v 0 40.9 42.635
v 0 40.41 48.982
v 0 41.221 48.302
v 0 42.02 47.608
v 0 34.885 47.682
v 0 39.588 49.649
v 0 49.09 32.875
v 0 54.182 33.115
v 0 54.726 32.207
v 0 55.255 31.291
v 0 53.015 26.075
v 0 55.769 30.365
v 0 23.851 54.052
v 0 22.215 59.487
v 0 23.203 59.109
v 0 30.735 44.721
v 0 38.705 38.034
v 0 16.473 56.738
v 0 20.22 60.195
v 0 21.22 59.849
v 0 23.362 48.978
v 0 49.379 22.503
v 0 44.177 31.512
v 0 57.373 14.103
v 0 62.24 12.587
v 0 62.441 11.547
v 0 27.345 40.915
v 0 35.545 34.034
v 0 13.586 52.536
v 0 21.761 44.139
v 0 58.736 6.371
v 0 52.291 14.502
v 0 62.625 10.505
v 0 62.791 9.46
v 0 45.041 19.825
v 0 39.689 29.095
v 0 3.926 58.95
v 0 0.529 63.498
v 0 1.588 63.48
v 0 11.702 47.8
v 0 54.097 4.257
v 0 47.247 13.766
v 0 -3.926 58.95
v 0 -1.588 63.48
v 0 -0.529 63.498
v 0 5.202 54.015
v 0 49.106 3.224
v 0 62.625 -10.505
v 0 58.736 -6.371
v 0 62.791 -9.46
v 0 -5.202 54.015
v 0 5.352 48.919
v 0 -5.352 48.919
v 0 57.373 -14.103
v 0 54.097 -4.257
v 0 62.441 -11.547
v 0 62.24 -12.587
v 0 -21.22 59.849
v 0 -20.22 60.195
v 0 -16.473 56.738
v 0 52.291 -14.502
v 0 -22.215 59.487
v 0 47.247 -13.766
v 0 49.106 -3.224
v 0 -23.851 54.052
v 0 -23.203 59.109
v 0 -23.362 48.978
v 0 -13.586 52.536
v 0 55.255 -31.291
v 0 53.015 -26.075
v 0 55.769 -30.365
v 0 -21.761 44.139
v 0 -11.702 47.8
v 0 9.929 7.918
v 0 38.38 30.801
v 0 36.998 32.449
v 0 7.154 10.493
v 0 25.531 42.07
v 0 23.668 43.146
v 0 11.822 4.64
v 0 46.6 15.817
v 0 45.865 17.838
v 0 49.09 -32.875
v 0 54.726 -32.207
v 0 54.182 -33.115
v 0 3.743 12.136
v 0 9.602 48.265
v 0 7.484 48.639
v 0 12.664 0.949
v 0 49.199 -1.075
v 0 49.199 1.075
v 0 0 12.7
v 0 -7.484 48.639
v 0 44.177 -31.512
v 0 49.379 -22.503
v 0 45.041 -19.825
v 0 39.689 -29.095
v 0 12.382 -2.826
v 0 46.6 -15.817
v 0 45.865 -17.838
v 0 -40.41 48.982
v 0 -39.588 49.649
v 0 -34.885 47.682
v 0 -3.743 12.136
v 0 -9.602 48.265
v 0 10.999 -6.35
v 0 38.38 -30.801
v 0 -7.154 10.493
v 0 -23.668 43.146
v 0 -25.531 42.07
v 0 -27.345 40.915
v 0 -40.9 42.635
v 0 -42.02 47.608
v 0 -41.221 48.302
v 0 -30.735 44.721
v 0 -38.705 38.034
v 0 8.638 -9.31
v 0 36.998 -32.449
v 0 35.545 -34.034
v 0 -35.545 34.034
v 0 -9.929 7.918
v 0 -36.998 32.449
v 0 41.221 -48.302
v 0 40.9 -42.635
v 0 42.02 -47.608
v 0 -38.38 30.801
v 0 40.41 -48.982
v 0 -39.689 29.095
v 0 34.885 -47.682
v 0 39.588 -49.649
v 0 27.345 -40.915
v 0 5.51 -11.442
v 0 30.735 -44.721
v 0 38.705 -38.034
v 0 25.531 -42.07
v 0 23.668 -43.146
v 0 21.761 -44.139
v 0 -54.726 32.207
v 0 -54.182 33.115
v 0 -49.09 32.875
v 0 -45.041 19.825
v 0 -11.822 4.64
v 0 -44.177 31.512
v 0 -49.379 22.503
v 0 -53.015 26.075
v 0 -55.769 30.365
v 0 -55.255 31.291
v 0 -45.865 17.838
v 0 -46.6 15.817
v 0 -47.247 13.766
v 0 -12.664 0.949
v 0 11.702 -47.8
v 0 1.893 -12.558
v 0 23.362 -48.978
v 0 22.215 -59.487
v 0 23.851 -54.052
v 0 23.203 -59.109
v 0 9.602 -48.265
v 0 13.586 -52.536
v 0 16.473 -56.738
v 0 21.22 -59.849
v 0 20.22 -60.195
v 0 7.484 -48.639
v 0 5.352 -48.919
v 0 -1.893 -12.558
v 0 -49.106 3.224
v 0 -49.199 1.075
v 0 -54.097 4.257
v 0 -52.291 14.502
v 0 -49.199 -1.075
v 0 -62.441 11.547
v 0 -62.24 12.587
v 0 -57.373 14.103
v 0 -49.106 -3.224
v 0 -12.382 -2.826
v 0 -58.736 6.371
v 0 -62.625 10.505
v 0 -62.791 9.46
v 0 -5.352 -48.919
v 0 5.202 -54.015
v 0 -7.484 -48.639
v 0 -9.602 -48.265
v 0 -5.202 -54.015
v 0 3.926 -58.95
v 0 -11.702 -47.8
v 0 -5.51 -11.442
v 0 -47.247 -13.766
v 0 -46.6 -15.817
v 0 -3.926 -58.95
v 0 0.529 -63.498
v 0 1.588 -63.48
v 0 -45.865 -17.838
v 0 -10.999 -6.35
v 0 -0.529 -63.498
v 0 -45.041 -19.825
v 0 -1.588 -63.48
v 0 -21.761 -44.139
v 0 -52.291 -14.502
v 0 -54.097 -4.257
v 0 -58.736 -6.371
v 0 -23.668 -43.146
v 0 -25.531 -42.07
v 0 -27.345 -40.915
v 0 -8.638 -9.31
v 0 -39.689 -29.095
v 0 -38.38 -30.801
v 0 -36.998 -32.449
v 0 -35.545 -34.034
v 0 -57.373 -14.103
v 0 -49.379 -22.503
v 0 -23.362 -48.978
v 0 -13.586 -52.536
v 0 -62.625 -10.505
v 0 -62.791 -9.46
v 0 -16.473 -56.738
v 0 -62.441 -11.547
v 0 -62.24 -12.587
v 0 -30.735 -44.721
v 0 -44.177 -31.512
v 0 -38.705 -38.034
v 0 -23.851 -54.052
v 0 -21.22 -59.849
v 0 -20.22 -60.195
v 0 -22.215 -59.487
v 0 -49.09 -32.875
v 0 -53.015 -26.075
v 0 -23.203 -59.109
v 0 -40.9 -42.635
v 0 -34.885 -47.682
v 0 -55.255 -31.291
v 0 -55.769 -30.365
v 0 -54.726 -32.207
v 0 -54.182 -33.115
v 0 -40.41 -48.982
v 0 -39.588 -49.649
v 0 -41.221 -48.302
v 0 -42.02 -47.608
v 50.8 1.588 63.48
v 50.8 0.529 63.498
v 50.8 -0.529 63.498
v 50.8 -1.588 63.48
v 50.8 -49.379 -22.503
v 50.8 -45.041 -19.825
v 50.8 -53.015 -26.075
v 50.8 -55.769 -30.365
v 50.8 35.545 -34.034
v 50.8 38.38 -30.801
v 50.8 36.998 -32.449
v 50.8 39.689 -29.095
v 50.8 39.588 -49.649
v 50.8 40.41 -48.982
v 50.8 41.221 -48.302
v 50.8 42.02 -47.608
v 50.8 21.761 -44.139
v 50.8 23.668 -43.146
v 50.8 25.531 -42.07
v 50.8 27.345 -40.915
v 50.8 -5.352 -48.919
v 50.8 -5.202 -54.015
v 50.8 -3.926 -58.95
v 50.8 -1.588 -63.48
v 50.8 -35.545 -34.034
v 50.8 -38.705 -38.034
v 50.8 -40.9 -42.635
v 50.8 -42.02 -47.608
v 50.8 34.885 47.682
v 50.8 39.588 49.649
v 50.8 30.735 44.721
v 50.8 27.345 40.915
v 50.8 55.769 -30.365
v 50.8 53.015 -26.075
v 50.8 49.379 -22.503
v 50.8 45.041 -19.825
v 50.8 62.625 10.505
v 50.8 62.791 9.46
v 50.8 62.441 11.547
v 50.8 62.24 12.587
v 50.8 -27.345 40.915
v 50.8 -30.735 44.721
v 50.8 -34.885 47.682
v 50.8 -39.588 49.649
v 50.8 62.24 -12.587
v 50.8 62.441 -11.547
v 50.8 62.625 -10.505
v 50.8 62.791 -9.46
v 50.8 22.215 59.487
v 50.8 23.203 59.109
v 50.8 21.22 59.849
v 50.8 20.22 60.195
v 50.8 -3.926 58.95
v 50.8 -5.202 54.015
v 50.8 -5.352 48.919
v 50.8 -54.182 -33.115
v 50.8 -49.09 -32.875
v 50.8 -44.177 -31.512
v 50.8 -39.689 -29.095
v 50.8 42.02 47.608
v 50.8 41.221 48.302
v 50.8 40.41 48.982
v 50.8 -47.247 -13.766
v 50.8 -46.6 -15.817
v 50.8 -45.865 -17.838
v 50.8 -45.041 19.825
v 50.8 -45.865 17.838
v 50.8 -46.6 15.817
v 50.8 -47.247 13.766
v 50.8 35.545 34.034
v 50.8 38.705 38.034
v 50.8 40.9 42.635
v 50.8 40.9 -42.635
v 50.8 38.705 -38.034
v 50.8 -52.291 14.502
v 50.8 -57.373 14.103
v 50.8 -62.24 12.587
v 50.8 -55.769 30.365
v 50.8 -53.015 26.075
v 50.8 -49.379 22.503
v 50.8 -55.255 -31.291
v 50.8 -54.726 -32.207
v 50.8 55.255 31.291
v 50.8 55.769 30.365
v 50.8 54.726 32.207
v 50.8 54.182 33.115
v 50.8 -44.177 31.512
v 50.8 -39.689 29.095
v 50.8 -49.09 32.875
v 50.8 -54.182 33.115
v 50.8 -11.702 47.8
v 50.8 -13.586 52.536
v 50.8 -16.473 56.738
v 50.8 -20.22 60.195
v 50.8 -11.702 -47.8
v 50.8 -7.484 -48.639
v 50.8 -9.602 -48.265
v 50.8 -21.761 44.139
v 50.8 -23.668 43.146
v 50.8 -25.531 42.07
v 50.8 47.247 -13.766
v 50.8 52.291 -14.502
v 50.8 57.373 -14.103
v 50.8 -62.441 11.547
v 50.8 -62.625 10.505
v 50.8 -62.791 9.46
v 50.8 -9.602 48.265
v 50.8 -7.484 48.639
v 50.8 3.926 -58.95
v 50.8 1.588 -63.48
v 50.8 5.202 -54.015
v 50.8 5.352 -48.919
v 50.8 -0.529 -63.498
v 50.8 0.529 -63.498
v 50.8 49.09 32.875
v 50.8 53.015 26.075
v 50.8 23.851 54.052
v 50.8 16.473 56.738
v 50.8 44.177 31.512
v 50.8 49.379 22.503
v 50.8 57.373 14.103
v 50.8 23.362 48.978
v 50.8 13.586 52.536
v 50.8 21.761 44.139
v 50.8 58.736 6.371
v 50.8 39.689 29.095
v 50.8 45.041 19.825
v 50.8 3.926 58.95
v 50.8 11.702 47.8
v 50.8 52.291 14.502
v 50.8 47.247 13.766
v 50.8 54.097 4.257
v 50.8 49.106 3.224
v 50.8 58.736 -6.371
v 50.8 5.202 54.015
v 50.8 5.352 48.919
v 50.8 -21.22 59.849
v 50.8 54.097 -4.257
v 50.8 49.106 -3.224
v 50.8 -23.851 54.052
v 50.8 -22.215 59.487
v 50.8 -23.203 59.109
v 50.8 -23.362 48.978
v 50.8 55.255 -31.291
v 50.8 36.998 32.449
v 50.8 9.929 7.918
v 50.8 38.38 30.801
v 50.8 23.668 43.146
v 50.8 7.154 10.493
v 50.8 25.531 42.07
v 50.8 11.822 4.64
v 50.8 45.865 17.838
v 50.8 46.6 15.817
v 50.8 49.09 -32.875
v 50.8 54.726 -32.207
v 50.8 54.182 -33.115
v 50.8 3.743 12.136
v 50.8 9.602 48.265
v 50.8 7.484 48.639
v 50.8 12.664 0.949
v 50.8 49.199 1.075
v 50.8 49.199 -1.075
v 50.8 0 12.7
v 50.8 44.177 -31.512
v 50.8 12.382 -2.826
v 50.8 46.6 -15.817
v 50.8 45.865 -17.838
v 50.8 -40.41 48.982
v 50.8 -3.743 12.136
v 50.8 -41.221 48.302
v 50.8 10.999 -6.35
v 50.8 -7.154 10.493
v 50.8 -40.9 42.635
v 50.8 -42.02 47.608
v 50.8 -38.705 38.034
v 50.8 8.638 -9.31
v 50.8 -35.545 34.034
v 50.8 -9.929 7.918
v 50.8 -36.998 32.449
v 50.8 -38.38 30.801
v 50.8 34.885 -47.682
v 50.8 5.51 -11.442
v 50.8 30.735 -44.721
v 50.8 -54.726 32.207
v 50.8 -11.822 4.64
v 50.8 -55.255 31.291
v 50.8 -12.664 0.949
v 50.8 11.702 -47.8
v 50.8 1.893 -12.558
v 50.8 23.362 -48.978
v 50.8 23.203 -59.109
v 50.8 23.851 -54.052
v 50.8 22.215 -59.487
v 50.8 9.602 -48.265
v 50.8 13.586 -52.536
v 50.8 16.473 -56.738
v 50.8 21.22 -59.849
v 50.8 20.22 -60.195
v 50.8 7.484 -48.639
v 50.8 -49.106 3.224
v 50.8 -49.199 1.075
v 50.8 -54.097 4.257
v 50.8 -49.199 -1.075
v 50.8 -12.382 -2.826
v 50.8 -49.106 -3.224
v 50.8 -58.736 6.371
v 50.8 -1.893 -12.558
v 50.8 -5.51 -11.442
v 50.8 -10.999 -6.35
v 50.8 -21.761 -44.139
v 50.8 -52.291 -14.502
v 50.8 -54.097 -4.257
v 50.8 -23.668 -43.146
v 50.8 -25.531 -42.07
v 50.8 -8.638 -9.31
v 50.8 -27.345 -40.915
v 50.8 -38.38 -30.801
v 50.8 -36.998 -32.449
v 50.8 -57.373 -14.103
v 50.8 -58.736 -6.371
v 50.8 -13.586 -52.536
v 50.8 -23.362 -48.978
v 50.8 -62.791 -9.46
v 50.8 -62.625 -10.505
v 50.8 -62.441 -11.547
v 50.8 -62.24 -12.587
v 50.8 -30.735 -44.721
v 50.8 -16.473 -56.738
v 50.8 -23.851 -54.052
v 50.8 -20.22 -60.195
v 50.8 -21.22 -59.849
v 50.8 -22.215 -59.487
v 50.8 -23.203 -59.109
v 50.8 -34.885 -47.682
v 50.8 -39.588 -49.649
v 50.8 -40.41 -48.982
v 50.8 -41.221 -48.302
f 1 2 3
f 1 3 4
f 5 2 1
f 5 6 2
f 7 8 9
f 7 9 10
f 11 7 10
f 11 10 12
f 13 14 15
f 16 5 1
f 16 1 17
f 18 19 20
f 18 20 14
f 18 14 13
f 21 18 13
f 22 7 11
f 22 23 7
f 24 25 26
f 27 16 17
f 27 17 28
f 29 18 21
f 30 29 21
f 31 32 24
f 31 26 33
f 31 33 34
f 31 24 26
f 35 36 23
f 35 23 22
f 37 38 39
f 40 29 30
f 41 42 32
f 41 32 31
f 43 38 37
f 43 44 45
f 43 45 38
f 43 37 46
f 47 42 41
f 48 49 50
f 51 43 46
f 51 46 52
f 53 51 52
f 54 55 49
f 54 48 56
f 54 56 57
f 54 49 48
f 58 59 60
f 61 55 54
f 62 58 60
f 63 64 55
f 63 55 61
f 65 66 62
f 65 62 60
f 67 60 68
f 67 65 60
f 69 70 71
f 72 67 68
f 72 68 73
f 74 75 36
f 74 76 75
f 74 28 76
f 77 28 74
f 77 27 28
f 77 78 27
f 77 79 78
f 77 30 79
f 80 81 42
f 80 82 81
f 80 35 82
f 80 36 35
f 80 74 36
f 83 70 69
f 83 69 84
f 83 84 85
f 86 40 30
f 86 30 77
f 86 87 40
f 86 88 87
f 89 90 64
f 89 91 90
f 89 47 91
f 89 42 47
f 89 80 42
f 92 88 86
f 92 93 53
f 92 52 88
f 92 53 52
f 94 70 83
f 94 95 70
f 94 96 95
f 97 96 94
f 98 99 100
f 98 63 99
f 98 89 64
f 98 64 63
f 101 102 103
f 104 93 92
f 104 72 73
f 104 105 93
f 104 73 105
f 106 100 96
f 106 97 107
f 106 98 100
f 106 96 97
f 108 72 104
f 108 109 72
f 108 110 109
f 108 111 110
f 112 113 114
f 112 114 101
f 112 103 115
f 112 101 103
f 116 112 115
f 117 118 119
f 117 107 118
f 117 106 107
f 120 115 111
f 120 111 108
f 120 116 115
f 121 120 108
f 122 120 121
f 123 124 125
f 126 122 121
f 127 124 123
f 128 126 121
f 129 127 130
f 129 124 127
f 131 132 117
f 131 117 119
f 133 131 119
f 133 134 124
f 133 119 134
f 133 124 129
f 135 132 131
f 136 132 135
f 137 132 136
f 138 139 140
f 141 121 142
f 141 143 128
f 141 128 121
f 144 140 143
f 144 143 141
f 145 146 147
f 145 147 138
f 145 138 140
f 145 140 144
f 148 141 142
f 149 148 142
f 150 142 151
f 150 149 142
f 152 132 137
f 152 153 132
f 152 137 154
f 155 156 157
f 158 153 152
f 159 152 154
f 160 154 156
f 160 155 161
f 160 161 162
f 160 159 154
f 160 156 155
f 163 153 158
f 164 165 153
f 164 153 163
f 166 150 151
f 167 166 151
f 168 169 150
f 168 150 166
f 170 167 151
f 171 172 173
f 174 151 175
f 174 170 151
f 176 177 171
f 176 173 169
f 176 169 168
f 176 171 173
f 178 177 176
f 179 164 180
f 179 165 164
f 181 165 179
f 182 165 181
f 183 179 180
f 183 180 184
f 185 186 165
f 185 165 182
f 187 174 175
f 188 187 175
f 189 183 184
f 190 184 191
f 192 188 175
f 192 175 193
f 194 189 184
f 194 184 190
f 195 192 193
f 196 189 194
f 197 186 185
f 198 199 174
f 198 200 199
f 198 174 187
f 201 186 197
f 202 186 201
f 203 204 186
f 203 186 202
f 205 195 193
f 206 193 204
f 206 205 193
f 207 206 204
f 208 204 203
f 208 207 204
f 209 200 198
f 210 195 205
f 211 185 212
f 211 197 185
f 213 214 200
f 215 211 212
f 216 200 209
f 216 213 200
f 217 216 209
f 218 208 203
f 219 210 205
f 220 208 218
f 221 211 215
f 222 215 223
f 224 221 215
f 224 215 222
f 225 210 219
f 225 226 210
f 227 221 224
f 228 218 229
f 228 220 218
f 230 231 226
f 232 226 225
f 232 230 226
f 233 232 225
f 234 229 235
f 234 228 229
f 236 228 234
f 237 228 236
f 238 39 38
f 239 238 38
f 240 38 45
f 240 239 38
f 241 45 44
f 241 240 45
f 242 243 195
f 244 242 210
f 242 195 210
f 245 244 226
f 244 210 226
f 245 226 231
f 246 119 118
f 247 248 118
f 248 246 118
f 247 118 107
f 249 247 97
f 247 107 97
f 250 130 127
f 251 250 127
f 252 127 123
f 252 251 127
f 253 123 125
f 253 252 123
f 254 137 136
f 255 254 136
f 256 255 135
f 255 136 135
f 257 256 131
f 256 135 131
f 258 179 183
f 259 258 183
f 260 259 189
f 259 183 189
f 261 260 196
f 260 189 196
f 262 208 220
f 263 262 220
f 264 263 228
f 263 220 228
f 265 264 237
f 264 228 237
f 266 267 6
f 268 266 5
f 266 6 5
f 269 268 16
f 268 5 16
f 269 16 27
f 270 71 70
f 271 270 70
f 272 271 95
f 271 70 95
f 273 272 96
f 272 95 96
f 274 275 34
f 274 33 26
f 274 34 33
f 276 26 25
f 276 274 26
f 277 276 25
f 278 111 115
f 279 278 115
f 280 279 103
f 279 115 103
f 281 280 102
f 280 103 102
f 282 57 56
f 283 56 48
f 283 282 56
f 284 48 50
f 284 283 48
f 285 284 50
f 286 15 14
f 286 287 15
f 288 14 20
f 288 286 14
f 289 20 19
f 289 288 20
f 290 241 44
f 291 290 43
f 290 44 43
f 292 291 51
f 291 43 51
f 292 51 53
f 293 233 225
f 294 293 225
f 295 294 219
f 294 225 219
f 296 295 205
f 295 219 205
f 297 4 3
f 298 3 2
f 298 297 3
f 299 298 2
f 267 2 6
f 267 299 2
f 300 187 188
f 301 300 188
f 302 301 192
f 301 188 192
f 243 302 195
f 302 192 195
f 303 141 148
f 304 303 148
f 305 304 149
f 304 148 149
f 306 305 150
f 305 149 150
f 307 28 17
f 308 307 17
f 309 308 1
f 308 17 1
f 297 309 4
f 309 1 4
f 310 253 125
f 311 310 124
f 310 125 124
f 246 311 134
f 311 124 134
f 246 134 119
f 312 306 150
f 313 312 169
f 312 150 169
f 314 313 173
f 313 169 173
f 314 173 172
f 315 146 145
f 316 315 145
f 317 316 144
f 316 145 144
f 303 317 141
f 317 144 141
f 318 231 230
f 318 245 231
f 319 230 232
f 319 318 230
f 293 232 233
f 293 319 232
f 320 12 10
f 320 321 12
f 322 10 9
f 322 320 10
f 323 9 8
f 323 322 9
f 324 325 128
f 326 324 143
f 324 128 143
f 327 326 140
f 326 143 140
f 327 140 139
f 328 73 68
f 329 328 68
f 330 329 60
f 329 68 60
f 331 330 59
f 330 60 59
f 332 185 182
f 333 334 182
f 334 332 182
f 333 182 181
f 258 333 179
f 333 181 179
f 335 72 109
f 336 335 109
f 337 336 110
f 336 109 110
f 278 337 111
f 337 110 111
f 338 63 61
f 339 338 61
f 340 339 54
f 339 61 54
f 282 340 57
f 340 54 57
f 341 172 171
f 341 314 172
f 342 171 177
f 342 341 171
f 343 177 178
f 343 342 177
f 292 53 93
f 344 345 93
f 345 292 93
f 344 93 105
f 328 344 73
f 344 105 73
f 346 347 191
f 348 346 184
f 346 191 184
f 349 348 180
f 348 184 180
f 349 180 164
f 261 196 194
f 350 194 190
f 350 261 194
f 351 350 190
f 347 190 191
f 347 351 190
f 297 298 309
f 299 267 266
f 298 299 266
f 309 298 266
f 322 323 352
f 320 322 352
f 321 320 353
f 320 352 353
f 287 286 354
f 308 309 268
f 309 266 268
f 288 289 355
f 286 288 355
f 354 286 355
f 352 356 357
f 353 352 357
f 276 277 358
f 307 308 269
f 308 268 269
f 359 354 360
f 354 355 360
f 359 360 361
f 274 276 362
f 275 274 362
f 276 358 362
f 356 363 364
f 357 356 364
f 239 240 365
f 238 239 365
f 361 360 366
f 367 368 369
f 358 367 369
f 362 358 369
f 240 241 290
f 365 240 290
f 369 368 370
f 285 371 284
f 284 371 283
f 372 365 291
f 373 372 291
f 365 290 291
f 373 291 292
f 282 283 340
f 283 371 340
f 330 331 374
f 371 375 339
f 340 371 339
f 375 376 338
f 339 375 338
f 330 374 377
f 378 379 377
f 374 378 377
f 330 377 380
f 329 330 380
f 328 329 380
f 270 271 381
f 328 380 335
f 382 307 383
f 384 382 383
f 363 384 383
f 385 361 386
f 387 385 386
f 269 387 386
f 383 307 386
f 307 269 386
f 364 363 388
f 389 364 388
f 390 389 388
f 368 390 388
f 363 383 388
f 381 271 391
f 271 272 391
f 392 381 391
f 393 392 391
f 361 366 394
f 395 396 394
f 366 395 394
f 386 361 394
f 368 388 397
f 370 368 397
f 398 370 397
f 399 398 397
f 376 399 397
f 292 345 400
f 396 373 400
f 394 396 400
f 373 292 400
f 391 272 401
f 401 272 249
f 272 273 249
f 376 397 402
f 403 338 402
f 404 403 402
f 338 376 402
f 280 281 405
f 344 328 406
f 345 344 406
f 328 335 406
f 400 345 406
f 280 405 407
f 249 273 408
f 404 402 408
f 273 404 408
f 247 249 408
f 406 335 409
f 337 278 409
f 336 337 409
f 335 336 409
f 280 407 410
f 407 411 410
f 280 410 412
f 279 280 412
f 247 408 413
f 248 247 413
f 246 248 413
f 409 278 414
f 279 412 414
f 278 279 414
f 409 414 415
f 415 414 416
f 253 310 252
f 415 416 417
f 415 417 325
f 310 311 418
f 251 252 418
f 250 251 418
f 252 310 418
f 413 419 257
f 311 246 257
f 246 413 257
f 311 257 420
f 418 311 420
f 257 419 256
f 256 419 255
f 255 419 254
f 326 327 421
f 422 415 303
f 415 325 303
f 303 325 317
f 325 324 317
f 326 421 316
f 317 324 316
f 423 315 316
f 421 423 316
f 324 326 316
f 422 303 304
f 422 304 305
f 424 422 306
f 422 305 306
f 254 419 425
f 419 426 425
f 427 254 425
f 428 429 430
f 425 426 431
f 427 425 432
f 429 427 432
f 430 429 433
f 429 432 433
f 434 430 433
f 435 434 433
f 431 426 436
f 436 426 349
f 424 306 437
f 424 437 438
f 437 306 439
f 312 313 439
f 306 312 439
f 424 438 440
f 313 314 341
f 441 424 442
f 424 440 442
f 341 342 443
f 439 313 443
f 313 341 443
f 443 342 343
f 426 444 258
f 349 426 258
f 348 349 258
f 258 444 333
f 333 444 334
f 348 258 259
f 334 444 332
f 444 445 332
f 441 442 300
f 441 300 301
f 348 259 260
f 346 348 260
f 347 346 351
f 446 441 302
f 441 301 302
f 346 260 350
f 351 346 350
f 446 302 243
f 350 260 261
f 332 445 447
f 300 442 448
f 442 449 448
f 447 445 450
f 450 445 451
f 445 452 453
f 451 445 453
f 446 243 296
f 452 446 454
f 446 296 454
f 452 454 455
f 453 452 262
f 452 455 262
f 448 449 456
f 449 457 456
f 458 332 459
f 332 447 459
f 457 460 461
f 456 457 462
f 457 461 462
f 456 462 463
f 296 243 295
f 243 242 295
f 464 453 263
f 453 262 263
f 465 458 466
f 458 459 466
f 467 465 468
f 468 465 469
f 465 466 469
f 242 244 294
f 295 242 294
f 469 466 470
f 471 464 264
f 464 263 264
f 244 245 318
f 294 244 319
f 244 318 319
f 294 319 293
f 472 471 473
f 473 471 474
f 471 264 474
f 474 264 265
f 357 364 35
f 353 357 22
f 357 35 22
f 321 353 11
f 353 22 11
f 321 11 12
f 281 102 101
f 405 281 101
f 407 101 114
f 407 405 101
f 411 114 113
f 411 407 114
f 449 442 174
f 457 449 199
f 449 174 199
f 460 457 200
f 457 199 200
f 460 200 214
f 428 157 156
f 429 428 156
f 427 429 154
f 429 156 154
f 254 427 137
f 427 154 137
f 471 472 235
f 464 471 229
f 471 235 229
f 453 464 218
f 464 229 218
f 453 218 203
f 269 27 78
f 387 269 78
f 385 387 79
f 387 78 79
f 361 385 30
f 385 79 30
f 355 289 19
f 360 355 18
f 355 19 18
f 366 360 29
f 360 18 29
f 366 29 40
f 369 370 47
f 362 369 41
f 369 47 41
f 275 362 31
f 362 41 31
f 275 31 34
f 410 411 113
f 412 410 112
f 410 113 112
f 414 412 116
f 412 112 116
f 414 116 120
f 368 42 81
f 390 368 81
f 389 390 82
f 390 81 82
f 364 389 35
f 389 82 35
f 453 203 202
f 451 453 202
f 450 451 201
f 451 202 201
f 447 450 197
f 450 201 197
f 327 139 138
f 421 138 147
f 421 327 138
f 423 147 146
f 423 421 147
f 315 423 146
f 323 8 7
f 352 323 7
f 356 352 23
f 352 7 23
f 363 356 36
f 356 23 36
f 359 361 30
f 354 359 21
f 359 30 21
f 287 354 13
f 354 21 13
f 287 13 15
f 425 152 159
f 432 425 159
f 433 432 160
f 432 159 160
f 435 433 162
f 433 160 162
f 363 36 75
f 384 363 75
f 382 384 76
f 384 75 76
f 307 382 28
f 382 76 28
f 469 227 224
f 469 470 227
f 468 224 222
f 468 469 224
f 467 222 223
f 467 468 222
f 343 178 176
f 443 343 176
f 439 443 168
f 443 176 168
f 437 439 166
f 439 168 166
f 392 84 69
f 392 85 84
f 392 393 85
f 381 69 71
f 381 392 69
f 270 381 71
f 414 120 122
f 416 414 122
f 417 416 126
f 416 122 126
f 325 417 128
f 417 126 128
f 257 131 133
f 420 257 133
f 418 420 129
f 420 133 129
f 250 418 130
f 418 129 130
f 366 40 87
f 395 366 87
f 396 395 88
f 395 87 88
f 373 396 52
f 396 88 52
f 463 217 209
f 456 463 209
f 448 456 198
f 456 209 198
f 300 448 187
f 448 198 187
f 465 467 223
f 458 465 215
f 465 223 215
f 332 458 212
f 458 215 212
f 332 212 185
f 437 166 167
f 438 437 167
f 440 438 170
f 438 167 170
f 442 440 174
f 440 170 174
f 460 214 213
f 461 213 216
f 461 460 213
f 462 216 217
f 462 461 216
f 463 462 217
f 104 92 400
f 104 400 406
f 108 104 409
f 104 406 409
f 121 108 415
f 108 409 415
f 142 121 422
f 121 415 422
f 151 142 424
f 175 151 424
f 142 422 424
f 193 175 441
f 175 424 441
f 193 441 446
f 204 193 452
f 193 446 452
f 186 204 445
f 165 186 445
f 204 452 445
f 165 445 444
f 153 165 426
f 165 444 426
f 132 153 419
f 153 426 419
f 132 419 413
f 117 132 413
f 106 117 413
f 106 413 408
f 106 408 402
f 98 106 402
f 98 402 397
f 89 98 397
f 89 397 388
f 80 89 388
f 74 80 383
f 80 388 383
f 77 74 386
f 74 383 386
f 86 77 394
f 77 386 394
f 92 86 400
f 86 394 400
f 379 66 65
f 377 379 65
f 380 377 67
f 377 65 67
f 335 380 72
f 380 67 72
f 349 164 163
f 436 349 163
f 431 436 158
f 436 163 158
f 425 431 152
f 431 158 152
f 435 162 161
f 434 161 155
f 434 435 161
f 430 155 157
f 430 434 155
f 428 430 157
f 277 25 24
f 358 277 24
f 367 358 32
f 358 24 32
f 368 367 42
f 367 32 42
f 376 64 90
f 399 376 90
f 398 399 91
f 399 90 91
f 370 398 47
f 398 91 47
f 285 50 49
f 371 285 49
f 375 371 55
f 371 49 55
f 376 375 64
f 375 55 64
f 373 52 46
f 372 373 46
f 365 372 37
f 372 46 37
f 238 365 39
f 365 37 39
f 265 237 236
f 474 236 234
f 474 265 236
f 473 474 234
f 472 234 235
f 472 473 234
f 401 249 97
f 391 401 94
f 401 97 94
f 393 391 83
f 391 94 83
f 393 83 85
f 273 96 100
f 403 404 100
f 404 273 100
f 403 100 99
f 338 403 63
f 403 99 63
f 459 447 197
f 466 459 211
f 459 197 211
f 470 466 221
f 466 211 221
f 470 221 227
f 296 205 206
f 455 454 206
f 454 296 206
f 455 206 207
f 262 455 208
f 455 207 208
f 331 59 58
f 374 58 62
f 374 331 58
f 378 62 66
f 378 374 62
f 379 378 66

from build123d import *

# Parameters (mm, degrees)
BASPROSKE_W     = 50.8
BASPROSKE_H     = 63.5
TOOTHCUT_DEPTH  = 104.175287739
TEETHCUTS_COUNT = 18
BORSKE_R        = 12.7
BORE_DEPTH      = 50.8000508


with BuildPart() as part:
    # BasProSke → Base-Revolve (revolve)
    with BuildSketch(Plane(origin=(0, 0, 0), x_dir=(1, 0, 0), z_dir=(0, 1, 0)), mode=Mode.PRIVATE) as base_revolve_sk:
        with Locations((25.4, 31.75)):
            Rectangle(BASPROSKE_W, BASPROSKE_H)
    revolve(base_revolve_sk.sketch.rotate(Axis((-10, 0, 0), (1, 0, 0)), 180), axis=Axis((-10, 0, 0), (1, 0, 0)))

    # TooCutSke → ToothCut (cut, through all)
    with BuildSketch(Plane(origin=(0, 0, 0), x_dir=(0, 0, -1), z_dir=(1, 0, 0))):
        with BuildLine():
            ThreePointArc((3.223886101, 49.105516152), (0, 49.21123), (-3.223886101, 49.105516152))
            ThreePointArc((-3.223886101, 49.105516152), (-5.190584502, 56.49010796), (-9.481297068, 62.813863526))
            ThreePointArc((-9.481297068, 62.813863526), (0, 63.5254), (9.481297068, 62.813863526))
            ThreePointArc((9.481297068, 62.813863526), (5.190584502, 56.49010796), (3.223886101, 49.105516152))
        make_face()
    toothcut = extrude(amount=TOOTHCUT_DEPTH, mode=Mode.SUBTRACT)

    # TeethCuts: ToothCut ×18 about axis
    teethcuts_axis = Axis((0, 0, 0), (1, 0, 0))
    for i in range(1, TEETHCUTS_COUNT):
        add(toothcut.rotate(teethcuts_axis, i * 360 / TEETHCUTS_COUNT), mode=Mode.SUBTRACT)

    # BorSke → Bore (cut, symmetric)
    with BuildSketch(Plane(origin=(0, 0, 0), x_dir=(0, 0, -1), z_dir=(1, 0, 0))):
        with Locations(Location((0, 0, 0), (0, 0, 180))):
            Circle(BORSKE_R)
    extrude(amount=BORE_DEPTH, both=True, mode=Mode.SUBTRACT)


solid = part.part
